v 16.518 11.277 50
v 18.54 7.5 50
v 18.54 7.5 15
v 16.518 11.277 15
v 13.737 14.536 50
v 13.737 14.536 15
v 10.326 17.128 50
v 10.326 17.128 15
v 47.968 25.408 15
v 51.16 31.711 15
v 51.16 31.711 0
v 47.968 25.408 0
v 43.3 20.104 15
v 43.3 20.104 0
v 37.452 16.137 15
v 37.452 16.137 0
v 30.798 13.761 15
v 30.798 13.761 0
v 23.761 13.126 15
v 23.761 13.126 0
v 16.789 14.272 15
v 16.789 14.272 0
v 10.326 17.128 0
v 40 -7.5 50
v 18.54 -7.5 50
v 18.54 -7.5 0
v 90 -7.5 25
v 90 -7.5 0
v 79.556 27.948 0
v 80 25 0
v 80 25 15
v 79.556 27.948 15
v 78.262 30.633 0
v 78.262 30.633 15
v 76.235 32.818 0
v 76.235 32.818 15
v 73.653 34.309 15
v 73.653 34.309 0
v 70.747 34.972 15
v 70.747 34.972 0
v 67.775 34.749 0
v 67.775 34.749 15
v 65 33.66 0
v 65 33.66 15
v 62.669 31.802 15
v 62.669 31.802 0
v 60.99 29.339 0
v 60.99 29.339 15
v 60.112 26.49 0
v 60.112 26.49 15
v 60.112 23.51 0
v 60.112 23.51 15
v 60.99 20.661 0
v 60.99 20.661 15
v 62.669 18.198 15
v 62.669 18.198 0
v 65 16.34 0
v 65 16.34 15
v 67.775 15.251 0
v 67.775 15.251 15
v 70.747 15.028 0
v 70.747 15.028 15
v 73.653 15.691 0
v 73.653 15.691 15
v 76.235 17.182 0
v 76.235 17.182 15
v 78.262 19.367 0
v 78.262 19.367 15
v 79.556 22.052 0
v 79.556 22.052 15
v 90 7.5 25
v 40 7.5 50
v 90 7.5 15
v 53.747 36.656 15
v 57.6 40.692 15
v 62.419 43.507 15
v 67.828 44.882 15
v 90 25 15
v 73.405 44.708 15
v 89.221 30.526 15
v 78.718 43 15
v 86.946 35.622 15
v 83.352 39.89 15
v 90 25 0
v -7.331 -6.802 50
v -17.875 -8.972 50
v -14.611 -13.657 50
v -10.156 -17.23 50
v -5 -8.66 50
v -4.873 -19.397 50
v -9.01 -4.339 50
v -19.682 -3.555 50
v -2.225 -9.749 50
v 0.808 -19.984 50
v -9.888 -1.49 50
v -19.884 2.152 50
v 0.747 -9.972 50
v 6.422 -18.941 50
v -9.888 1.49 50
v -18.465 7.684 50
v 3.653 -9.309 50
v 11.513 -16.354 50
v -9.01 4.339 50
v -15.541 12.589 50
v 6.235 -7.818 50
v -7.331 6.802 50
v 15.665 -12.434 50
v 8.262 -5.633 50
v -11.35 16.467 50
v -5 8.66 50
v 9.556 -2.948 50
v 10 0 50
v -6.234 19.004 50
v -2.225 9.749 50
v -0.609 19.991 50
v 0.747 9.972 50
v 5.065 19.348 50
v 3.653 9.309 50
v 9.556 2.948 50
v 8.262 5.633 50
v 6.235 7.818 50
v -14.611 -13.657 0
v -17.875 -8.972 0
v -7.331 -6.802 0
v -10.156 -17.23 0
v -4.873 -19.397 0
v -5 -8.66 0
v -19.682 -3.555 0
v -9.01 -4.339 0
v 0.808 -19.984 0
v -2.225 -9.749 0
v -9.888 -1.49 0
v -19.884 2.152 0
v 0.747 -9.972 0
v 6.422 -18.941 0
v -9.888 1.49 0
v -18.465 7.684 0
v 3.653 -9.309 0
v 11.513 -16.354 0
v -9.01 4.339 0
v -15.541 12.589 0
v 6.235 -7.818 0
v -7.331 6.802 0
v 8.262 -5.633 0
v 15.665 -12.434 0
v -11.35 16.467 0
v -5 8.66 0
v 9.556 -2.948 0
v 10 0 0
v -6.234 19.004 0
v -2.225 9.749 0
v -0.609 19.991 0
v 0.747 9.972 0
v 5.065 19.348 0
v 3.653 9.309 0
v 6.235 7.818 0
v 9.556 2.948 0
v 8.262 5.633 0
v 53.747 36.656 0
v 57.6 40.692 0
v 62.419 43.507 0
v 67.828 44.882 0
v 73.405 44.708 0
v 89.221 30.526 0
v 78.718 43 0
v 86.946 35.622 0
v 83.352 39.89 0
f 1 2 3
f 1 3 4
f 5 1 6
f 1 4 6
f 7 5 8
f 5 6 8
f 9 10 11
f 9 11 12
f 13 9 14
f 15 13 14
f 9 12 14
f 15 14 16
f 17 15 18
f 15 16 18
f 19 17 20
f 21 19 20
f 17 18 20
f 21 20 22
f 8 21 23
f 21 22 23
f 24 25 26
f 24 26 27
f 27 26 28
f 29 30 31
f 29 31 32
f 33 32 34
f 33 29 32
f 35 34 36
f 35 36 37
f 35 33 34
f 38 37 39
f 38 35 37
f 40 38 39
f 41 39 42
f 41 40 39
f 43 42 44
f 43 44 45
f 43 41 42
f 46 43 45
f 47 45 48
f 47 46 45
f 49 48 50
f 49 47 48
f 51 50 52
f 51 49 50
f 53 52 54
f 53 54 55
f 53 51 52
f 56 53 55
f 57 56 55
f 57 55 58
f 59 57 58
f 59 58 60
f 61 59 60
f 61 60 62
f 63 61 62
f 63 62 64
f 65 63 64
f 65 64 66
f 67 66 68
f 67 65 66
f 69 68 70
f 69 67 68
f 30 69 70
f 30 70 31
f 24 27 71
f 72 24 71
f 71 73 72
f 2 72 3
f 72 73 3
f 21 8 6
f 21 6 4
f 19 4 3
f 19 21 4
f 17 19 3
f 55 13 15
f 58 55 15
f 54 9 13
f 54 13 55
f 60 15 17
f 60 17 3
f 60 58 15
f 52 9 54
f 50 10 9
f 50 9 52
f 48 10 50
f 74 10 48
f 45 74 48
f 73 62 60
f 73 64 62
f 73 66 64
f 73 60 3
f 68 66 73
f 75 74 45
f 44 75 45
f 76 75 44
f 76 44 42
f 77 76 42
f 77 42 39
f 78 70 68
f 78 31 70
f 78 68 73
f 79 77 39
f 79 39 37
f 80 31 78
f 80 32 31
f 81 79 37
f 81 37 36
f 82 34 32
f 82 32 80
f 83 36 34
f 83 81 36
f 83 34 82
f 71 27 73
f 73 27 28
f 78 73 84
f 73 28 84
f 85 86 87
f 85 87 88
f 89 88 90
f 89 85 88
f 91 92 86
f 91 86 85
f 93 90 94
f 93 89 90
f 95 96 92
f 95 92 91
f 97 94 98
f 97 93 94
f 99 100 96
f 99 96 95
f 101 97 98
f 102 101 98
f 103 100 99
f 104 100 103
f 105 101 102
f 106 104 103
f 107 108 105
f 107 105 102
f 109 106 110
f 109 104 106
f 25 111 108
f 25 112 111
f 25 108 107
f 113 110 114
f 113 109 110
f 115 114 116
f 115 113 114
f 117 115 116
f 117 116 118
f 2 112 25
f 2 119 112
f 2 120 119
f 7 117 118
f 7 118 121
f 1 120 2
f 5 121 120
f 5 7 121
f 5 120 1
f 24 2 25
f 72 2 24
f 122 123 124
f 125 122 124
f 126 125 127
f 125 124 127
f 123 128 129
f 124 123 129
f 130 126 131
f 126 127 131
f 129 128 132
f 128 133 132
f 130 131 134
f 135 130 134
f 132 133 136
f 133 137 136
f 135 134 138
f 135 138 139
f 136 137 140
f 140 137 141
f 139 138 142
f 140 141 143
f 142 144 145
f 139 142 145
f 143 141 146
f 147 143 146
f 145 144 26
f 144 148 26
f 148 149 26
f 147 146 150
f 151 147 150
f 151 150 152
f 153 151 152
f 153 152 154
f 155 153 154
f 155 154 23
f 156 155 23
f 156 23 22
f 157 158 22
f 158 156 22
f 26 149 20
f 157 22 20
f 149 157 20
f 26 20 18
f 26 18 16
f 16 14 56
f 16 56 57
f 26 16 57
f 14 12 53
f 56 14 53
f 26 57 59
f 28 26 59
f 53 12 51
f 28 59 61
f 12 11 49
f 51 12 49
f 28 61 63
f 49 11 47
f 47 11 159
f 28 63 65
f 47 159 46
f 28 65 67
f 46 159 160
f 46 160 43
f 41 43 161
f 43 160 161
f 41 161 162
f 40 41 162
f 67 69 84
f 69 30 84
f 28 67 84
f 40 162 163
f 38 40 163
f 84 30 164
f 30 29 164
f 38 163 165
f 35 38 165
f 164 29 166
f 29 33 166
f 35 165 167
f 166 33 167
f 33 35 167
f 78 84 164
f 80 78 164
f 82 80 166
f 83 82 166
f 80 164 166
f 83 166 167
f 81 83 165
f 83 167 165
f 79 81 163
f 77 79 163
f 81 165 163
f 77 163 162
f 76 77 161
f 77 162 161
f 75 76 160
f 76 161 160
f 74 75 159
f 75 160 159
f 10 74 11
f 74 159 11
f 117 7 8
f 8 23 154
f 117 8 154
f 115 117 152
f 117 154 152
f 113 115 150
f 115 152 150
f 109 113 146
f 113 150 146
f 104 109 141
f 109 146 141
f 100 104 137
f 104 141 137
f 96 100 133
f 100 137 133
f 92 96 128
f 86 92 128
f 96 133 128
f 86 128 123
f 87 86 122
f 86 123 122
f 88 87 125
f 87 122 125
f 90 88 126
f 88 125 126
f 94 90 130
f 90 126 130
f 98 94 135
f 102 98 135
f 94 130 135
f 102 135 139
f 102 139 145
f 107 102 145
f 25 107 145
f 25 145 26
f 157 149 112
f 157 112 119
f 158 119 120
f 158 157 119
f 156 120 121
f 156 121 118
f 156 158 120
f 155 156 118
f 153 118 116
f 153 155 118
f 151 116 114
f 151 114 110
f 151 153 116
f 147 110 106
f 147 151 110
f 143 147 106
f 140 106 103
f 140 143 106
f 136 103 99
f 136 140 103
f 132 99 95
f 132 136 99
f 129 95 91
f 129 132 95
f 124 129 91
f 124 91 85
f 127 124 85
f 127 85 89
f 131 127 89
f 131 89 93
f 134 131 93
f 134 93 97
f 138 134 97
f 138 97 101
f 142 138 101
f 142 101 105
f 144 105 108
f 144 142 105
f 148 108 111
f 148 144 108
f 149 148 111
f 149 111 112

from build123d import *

# Parameters (mm, degrees)
SKETCH3_R           = 10
BOSS_EXTRUDE2_DEPTH = 50
SKETCH3_4_R         = 10
BOSS_EXTRUDE3_DEPTH = 15
CHAMFER1_SIZE       = 50
CHAMFER1_SIZE2      = 25


with BuildPart() as part:
    # Sketch3 → Boss-Extrude2 (new body)
    with BuildSketch(Plane.XY):
        with BuildLine():
            Line((90, -7.5), (90, 7.5))
            Line((90, 7.5), (18.540496218, 7.5))
            ThreePointArc((18.540496218, 7.5), (15.215049384, 12.980842508), (10.326323506, 17.127960849))
            ThreePointArc((10.326323506, 17.127960849), (-18.972544219, -6.327919552), (18.540496218, -7.5))
            Line((18.540496218, -7.5), (90, -7.5))
        make_face()
        Circle(SKETCH3_R, mode=Mode.SUBTRACT)
    extrude(amount=BOSS_EXTRUDE2_DEPTH)

    # Sketch3<4> → Boss-Extrude3 (add)
    with BuildSketch(Plane.XY):
        with BuildLine():
            Line((90, 7.5), (90, 25))
            ThreePointArc((90, 25), (73.405373459, 44.707953511), (51.15965684, 31.711294182))
            ThreePointArc((51.15965684, 31.711294182), (34.200595531, 14.738332513), (10.326323506, 17.127960849))
            ThreePointArc((10.326323506, 17.127960849), (15.215049384, 12.980842508), (18.540496218, 7.5))
            Line((18.540496218, 7.5), (90, 7.5))
        make_face()
        with Locations((70, 25)):
            Circle(SKETCH3_4_R, mode=Mode.SUBTRACT)
    extrude(amount=BOSS_EXTRUDE3_DEPTH)

    # Chamfer1
    chamfer1_edges = [part.edges().sort_by_distance(p)[0] for p in [
        (90, 0, 50),
    ]]
    chamfer1_side = [part.faces().sort_by_distance(p)[0] for p in [
        (28.950156373, 0, 50),
    ]]
    chamfer(chamfer1_edges, length=CHAMFER1_SIZE, length2=CHAMFER1_SIZE2, reference=chamfer1_side[0])


solid = part.part
